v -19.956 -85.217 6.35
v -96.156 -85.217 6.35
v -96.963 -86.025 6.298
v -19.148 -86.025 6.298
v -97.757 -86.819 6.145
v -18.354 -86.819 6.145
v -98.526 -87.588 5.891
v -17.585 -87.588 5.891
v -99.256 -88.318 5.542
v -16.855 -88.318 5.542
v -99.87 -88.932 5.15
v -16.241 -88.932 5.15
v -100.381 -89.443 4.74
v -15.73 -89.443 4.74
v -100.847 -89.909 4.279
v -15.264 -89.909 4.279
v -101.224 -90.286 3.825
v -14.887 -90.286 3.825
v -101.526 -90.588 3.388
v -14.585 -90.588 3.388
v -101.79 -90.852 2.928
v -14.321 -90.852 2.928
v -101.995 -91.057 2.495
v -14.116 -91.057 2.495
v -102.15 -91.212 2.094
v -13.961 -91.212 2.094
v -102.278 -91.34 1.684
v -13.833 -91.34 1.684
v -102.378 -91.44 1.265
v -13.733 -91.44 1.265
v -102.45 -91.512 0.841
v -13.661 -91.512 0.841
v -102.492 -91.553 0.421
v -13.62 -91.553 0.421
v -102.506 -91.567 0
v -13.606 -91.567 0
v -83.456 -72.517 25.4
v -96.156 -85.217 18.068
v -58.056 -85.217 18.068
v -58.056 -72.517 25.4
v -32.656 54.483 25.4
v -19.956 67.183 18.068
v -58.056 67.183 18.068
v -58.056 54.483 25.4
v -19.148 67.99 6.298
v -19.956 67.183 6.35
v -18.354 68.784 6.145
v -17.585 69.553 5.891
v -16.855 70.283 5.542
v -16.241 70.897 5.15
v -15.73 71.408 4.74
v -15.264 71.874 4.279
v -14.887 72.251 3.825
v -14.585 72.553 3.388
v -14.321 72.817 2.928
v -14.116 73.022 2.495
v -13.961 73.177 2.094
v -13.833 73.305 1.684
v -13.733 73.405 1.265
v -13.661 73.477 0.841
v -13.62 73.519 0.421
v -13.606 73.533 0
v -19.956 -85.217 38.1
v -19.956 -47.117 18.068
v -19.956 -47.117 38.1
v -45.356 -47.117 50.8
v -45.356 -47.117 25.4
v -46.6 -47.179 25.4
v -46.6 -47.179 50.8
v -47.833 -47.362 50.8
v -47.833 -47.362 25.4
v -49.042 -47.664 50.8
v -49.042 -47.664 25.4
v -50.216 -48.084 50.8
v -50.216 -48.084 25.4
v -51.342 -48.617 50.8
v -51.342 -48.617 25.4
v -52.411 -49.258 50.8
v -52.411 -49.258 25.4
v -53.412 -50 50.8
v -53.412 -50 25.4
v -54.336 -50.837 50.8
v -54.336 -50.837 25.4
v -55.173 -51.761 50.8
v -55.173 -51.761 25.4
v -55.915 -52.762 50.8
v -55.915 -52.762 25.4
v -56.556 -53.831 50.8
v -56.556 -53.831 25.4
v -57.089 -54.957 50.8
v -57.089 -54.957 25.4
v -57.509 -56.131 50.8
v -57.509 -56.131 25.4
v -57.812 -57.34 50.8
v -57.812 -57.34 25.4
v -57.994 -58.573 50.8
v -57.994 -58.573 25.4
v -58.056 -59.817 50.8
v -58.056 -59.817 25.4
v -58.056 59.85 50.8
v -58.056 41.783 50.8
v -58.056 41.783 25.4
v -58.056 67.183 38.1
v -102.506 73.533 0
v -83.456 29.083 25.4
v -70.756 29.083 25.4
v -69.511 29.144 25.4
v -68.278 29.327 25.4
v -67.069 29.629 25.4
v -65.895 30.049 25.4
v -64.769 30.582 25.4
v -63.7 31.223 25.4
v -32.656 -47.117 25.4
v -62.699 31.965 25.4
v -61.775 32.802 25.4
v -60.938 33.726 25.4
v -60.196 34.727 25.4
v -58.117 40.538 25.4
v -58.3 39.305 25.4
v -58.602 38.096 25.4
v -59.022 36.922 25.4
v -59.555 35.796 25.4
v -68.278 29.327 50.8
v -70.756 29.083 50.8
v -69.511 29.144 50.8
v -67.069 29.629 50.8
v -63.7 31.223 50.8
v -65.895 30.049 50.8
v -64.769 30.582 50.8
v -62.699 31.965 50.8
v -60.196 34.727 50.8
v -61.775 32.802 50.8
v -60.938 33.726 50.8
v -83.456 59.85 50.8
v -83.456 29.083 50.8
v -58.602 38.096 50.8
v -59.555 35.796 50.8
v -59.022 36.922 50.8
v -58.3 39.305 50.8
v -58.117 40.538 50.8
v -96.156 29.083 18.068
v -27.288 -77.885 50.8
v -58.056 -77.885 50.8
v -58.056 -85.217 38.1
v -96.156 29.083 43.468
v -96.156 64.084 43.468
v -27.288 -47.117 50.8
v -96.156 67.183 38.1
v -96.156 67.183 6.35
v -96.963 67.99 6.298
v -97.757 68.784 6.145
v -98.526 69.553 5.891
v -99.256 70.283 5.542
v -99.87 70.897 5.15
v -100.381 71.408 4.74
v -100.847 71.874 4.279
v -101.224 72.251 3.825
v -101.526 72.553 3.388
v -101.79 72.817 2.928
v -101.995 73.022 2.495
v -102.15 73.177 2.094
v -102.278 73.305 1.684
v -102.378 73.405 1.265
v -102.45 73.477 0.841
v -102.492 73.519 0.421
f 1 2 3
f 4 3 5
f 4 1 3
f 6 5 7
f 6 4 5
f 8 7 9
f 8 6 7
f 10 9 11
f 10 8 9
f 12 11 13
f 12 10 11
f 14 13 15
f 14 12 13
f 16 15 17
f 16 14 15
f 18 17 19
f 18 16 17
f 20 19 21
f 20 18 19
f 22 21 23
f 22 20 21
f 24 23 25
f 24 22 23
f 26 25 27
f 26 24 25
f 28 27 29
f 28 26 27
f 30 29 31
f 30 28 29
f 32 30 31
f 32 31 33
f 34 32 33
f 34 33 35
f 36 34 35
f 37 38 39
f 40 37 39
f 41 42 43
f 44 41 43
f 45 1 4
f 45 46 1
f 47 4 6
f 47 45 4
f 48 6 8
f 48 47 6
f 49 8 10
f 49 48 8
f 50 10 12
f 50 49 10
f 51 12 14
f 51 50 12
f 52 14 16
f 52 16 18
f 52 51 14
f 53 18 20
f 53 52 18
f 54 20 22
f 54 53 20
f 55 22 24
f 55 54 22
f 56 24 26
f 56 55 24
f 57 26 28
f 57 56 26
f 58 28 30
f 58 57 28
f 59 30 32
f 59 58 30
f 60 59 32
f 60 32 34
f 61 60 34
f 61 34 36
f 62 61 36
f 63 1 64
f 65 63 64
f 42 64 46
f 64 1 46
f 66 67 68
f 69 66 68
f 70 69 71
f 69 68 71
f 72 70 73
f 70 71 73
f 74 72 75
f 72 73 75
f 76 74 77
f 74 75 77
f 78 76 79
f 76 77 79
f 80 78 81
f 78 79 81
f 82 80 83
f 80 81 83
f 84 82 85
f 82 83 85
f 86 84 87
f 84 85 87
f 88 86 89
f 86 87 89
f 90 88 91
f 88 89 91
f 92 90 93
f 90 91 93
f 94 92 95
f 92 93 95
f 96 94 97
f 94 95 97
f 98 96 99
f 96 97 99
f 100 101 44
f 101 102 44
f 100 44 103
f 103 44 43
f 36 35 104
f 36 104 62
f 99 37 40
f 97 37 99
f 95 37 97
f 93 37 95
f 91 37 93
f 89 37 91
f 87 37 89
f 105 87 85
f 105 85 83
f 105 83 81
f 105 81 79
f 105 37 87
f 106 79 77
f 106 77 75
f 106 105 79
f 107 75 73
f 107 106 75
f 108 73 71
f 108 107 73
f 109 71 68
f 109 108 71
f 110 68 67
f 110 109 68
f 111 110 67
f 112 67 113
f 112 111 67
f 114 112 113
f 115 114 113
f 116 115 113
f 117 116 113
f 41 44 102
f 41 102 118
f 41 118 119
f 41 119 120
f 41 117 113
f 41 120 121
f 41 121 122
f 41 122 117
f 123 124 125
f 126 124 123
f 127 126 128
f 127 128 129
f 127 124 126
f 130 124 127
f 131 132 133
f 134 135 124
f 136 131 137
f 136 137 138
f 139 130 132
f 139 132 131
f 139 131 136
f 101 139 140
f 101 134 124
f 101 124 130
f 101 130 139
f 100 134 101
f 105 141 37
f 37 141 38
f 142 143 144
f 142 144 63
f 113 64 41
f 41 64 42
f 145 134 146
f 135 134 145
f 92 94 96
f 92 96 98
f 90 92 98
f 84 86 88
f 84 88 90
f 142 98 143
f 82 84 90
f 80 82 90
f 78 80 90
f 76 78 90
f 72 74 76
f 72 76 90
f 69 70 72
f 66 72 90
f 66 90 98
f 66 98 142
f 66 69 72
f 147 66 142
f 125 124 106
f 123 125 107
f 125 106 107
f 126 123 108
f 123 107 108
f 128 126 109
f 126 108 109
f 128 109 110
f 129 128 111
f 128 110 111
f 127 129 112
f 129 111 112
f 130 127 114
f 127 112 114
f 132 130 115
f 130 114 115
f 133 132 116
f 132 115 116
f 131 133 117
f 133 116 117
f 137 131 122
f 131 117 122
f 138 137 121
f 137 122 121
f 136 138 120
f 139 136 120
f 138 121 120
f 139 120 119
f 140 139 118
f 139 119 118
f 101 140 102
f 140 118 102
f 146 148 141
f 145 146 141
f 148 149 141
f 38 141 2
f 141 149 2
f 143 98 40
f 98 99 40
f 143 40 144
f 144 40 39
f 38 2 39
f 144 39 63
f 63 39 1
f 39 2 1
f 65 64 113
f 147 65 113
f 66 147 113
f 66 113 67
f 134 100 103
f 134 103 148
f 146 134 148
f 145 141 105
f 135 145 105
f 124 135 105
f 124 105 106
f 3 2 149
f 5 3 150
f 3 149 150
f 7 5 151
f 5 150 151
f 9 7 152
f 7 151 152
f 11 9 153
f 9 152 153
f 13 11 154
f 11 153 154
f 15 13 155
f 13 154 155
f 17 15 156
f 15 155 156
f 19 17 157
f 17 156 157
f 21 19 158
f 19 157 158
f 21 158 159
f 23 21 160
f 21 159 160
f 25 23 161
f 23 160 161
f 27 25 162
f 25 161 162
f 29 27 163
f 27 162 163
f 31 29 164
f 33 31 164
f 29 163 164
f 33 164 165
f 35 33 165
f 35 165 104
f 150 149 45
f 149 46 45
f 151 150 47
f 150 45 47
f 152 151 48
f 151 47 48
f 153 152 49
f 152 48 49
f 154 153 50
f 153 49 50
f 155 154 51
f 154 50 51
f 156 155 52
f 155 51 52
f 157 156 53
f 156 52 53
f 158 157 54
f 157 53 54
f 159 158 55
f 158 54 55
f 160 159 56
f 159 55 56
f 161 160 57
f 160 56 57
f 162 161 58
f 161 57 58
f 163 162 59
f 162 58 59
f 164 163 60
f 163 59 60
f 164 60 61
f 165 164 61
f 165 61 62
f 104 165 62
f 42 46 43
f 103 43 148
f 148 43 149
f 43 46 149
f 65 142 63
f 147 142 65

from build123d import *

# Parameters (mm, degrees)
F1_DEPTH    = 50.8
F2_DEPTH    = 25.4
F0_W        = 88.9
F0_H        = 165.1
F3_DEPTH    = 6.35
F4_SIZE2    = 7.3323484187
F4_SIZE     = 12.7
F5_C1_SIZE2 = 7.3323484187
F5_C1_SIZE  = 12.7
F5_C2_SIZE2 = 7.3323484187
F5_C2_SIZE  = 12.7
F5_C3_SIZE2 = 12.7
F5_C3_SIZE  = 7.3323484187
F5_C4_SIZE2 = 7.3323484187
F5_C4_SIZE  = 12.7
F6_R        = 6.34999


# Not quite as in the source:
# - a fillet or chamfer is up to 0.001 mm smaller than in the source, because OpenCascade refuses the exact size


with BuildPart() as f1:
    # F0 (on Top) → F1 (new body)
    with BuildSketch(Plane.XY):
        with BuildLine():
            Line((-19.9555572391, -85.2174787462), (-19.9555572391, -47.1174787462))
            Line((-19.9555572391, -47.1174787462), (-45.3555572391, -47.1174787462))
            ThreePointArc((-45.3555572391, -47.1174787462), (-54.3358133601, -50.8372226251), (-58.0555572391, -59.8174787462))
            Line((-58.0555572391, -59.8174787462), (-58.0555572391, -85.2174787462))
            Line((-58.0555572391, -85.2174787462), (-19.9555572391, -85.2174787462))
        make_face()
    extrude(amount=F1_DEPTH)



with BuildPart() as f1b:
    # F0 (on Top) → F1, piece 2 (new body)
    with BuildSketch(Plane.XY):
        with BuildLine():
            Line((-58.0555572391, 67.1825212538), (-96.1555572391, 67.1825212538))
            Line((-96.1555572391, 67.1825212538), (-96.1555572391, 29.0825212538))
            Line((-96.1555572391, 29.0825212538), (-70.7555572391, 29.0825212538))
            ThreePointArc((-70.7555572391, 29.0825212538), (-61.775301118, 32.8022651328), (-58.0555572391, 41.7825212538))
            Line((-58.0555572391, 41.7825212538), (-58.0555572391, 67.1825212538))
        make_face()
    extrude(amount=F1_DEPTH)


with BuildPart() as f1_1:
    add(f1.part)

    add(f1b.part)  # F2 merges F1b
    # F0 (on Top) → F2 (join)
    with BuildSketch(Plane.XY):
        with BuildLine():
            Line((-19.9555572391, 67.1825212538), (-58.0555572391, 67.1825212538))
            Line((-58.0555572391, 67.1825212538), (-58.0555572391, 41.7825212538))
            ThreePointArc((-58.0555572391, 41.7825212538), (-61.775301118, 32.8022651328), (-70.7555572391, 29.0825212538))
            Line((-70.7555572391, 29.0825212538), (-96.1555572391, 29.0825212538))
            Line((-96.1555572391, 29.0825212538), (-96.1555572391, -85.2174787462))
            Line((-96.1555572391, -85.2174787462), (-58.0555572391, -85.2174787462))
            Line((-58.0555572391, -85.2174787462), (-58.0555572391, -59.8174787462))
            ThreePointArc((-58.0555572391, -59.8174787462), (-54.3358133601, -50.8372226251), (-45.3555572391, -47.1174787462))
            Line((-45.3555572391, -47.1174787462), (-19.9555572391, -47.1174787462))
            Line((-19.9555572391, -47.1174787462), (-19.9555572391, 67.1825212538))
        make_face()
    extrude(amount=F2_DEPTH)

    # F0 (on Top) → F3 (join)
    with BuildSketch(Plane.XY):
        with Locations((-58.0555572391, -9.0174787462)):
            Rectangle(F0_W, F0_H)
        Polygon((-96.1555572391, 29.0825212538), (-96.1555572391, 67.1825212538), (-58.0555572391, 67.1825212538), (-19.9555572391, 67.1825212538), (-19.9555572391, -47.1174787462), (-19.9555572391, -85.2174787462), (-58.0555572391, -85.2174787462), (-96.1555572391, -85.2174787462), align=None, mode=Mode.SUBTRACT)
    extrude(amount=F3_DEPTH)

    # F4
    f4_edges = [f1_1.edges().sort_by_distance(p)[0] for p in [
        (-96.155557, -28.067479, 25.4),
        (-77.105557, -85.217479, 25.4),
        (-19.955557, 10.032521, 25.4),
        (-39.005557, 67.182521, 25.4),
    ]]
    f4_side = f1_1.faces().sort_by_distance((-58.055557, -9.017479, 25.4))[0]
    chamfer(f4_edges, length=F4_SIZE, length2=F4_SIZE2, reference=f4_side)

    # F5: chamfer of 12.7 x 7.3323484187 on 4 edges, made by hand

    # F5_c1
    f5_c1_edges = [f1_1.edges().sort_by_distance(p)[0] for p in [
        (-77.1055572391, 67.1825212538, 50.8),
    ]]
    f5_c1_side = f1_1.faces().sort_by_distance((-77.1055572391, 67.1825212538, 50.6533530316))[0]
    chamfer(f5_c1_edges, length=F5_C1_SIZE, length2=F5_C1_SIZE2, reference=f5_c1_side)

    # F5_c2
    f5_c2_edges = [f1_1.edges().sort_by_distance(p)[0] for p in [
        (-19.9555572391, -66.1674787462, 50.8),
    ]]
    f5_c2_side = f1_1.faces().sort_by_distance((-19.9555572391, -66.1674787462, 50.6533530316))[0]
    chamfer(f5_c2_edges, length=F5_C2_SIZE, length2=F5_C2_SIZE2, reference=f5_c2_side)

    # F5_c3
    f5_c3_edges = [f1_1.edges().sort_by_distance(p)[0] for p in [
        (-96.1555572391, 44.4663470445, 50.8),
    ]]
    f5_c3_side = f1_1.faces().sort_by_distance((-96.1555572391, 44.4663470445, 50.6533530316))[0]
    chamfer(f5_c3_edges, length=F5_C3_SIZE, length2=F5_C3_SIZE2, reference=f5_c3_side)

    # F5_c4
    f5_c4_edges = [f1_1.edges().sort_by_distance(p)[0] for p in [
        (-42.6717314484, -85.2174787462, 50.8),
    ]]
    f5_c4_side = f1_1.faces().sort_by_distance((-42.6717314484, -85.2174787462, 50.6533530316))[0]
    chamfer(f5_c4_edges, length=F5_C4_SIZE, length2=F5_C4_SIZE2, reference=f5_c4_side)

    # F6 (radius 6.35 in the source; OpenCascade refuses exactly that, so slightly less here)
    f6_edges = [f1_1.edges().sort_by_distance(p)[0] for p in [
        (-58.055557, -91.567479, 6.35),
        (-13.605557, -9.017479, 6.35),
        (-102.505557, -9.017479, 6.35),
        (-58.055557, 73.532521, 6.35),
    ]]
    fillet(f6_edges, radius=F6_R)


solid = f1_1.part
